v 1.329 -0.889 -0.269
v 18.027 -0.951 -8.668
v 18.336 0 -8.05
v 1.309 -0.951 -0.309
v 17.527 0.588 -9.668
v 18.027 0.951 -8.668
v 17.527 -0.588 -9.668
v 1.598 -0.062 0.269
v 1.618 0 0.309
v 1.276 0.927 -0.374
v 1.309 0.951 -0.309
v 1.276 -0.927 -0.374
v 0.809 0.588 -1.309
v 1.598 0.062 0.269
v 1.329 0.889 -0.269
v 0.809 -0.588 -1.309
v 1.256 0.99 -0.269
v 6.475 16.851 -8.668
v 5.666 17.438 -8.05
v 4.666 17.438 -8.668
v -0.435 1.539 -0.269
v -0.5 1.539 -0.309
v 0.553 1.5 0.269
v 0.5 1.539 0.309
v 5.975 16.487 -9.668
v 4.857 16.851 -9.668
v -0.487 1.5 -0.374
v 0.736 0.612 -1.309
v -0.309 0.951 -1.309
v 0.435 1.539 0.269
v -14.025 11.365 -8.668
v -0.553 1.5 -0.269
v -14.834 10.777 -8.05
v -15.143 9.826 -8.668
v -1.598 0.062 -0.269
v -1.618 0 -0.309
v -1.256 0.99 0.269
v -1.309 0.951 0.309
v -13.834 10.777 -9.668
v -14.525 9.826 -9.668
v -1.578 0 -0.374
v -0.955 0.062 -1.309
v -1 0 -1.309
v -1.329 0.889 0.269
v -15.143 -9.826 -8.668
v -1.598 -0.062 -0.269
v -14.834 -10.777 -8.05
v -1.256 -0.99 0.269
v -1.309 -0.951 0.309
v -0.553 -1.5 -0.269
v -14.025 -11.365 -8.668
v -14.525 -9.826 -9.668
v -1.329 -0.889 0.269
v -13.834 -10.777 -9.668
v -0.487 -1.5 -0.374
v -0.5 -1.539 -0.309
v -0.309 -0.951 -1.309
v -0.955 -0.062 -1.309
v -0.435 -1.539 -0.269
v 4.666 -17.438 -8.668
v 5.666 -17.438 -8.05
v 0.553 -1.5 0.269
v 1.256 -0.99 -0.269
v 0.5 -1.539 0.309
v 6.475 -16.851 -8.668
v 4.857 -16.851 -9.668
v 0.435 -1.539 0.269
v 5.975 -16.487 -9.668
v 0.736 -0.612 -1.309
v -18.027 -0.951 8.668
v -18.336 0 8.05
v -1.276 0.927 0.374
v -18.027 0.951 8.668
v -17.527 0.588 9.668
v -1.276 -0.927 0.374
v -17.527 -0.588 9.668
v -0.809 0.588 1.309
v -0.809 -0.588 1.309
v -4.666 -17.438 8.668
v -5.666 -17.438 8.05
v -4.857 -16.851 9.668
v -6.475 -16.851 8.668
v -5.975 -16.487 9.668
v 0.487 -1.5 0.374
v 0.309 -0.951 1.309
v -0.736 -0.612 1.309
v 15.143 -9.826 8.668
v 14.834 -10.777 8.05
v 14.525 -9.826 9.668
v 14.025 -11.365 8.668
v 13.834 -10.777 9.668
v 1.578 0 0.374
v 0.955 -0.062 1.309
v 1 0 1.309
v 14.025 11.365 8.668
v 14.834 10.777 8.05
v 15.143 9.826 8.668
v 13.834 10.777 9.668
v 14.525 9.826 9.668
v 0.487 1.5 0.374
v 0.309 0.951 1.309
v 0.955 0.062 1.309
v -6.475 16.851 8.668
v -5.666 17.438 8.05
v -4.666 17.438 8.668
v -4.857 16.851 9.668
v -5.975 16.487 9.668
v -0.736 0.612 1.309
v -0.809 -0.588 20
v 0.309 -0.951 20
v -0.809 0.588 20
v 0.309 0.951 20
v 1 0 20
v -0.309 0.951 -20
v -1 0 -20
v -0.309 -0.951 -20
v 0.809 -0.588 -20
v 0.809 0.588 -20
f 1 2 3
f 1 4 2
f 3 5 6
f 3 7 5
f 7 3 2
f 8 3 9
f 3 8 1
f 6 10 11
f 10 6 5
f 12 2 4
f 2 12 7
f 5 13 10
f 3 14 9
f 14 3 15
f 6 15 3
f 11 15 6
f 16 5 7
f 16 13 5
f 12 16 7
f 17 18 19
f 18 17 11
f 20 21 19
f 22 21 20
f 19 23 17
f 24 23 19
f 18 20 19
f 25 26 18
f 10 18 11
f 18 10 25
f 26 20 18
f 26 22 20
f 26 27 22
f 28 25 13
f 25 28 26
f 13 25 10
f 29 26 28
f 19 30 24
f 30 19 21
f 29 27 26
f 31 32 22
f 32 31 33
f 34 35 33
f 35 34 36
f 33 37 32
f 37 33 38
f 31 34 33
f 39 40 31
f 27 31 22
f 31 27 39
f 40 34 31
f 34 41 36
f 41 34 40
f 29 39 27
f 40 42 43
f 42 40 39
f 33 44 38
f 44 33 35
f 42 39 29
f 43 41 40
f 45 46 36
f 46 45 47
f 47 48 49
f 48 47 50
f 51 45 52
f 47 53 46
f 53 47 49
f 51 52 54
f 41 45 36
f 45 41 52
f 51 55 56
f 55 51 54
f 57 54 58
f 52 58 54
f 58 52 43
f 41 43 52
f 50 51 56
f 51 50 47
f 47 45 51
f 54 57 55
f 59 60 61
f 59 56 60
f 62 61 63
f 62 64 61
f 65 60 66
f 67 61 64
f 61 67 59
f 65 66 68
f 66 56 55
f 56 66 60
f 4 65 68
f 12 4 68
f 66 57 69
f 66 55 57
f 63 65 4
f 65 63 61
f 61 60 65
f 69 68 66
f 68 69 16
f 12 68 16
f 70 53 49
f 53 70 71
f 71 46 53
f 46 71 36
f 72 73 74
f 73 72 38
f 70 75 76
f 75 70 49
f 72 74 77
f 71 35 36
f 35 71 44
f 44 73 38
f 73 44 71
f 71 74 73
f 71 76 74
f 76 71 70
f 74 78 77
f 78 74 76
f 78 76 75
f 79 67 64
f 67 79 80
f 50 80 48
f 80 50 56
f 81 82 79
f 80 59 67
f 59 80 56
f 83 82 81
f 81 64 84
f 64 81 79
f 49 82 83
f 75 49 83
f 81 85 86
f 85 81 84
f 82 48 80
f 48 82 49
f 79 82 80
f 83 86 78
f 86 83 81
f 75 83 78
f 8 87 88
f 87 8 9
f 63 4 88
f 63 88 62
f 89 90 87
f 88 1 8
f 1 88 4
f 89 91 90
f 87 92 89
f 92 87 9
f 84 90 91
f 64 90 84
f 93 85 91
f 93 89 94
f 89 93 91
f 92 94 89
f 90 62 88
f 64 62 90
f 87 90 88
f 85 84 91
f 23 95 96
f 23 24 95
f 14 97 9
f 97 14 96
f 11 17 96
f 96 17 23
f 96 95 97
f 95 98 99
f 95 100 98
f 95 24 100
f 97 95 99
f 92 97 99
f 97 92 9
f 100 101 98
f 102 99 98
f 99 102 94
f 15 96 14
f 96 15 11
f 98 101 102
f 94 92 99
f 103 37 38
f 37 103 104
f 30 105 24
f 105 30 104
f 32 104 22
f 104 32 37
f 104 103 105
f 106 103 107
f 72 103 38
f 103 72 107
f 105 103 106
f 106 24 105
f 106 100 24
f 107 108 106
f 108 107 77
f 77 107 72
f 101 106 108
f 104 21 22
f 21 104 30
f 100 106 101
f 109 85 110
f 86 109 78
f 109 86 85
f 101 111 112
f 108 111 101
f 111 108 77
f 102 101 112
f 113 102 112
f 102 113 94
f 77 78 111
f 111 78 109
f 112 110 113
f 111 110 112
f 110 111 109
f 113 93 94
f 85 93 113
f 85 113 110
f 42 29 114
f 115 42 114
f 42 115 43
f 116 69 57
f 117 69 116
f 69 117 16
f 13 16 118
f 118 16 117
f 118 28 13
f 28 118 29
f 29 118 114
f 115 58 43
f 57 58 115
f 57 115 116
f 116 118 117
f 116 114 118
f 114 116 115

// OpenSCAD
dA = 116.56505;
h = 20;// 1.30902;
n=5;


union() {
	cylinder(h,1,1, $fn=5);
	
	rotate([180,0,180])
	cylinder(h,1,1, $fn=5);
	
	color("green")
for (i=[0:n])
// 	
rotate([0,0,i*360/n])
rotate([0,dA-90,0])
	rotate([0,90,0])
	rotate([0,0,180])
	cylinder(h,1,1, $fn=5);

color("red")
for (i=[0:n])
// 	
rotate([0,0,(i*360/n+180)%360])
rotate([0,90-dA,0])
	rotate([0,90,0])
	cylinder(h,1,1, $fn=5);

}
